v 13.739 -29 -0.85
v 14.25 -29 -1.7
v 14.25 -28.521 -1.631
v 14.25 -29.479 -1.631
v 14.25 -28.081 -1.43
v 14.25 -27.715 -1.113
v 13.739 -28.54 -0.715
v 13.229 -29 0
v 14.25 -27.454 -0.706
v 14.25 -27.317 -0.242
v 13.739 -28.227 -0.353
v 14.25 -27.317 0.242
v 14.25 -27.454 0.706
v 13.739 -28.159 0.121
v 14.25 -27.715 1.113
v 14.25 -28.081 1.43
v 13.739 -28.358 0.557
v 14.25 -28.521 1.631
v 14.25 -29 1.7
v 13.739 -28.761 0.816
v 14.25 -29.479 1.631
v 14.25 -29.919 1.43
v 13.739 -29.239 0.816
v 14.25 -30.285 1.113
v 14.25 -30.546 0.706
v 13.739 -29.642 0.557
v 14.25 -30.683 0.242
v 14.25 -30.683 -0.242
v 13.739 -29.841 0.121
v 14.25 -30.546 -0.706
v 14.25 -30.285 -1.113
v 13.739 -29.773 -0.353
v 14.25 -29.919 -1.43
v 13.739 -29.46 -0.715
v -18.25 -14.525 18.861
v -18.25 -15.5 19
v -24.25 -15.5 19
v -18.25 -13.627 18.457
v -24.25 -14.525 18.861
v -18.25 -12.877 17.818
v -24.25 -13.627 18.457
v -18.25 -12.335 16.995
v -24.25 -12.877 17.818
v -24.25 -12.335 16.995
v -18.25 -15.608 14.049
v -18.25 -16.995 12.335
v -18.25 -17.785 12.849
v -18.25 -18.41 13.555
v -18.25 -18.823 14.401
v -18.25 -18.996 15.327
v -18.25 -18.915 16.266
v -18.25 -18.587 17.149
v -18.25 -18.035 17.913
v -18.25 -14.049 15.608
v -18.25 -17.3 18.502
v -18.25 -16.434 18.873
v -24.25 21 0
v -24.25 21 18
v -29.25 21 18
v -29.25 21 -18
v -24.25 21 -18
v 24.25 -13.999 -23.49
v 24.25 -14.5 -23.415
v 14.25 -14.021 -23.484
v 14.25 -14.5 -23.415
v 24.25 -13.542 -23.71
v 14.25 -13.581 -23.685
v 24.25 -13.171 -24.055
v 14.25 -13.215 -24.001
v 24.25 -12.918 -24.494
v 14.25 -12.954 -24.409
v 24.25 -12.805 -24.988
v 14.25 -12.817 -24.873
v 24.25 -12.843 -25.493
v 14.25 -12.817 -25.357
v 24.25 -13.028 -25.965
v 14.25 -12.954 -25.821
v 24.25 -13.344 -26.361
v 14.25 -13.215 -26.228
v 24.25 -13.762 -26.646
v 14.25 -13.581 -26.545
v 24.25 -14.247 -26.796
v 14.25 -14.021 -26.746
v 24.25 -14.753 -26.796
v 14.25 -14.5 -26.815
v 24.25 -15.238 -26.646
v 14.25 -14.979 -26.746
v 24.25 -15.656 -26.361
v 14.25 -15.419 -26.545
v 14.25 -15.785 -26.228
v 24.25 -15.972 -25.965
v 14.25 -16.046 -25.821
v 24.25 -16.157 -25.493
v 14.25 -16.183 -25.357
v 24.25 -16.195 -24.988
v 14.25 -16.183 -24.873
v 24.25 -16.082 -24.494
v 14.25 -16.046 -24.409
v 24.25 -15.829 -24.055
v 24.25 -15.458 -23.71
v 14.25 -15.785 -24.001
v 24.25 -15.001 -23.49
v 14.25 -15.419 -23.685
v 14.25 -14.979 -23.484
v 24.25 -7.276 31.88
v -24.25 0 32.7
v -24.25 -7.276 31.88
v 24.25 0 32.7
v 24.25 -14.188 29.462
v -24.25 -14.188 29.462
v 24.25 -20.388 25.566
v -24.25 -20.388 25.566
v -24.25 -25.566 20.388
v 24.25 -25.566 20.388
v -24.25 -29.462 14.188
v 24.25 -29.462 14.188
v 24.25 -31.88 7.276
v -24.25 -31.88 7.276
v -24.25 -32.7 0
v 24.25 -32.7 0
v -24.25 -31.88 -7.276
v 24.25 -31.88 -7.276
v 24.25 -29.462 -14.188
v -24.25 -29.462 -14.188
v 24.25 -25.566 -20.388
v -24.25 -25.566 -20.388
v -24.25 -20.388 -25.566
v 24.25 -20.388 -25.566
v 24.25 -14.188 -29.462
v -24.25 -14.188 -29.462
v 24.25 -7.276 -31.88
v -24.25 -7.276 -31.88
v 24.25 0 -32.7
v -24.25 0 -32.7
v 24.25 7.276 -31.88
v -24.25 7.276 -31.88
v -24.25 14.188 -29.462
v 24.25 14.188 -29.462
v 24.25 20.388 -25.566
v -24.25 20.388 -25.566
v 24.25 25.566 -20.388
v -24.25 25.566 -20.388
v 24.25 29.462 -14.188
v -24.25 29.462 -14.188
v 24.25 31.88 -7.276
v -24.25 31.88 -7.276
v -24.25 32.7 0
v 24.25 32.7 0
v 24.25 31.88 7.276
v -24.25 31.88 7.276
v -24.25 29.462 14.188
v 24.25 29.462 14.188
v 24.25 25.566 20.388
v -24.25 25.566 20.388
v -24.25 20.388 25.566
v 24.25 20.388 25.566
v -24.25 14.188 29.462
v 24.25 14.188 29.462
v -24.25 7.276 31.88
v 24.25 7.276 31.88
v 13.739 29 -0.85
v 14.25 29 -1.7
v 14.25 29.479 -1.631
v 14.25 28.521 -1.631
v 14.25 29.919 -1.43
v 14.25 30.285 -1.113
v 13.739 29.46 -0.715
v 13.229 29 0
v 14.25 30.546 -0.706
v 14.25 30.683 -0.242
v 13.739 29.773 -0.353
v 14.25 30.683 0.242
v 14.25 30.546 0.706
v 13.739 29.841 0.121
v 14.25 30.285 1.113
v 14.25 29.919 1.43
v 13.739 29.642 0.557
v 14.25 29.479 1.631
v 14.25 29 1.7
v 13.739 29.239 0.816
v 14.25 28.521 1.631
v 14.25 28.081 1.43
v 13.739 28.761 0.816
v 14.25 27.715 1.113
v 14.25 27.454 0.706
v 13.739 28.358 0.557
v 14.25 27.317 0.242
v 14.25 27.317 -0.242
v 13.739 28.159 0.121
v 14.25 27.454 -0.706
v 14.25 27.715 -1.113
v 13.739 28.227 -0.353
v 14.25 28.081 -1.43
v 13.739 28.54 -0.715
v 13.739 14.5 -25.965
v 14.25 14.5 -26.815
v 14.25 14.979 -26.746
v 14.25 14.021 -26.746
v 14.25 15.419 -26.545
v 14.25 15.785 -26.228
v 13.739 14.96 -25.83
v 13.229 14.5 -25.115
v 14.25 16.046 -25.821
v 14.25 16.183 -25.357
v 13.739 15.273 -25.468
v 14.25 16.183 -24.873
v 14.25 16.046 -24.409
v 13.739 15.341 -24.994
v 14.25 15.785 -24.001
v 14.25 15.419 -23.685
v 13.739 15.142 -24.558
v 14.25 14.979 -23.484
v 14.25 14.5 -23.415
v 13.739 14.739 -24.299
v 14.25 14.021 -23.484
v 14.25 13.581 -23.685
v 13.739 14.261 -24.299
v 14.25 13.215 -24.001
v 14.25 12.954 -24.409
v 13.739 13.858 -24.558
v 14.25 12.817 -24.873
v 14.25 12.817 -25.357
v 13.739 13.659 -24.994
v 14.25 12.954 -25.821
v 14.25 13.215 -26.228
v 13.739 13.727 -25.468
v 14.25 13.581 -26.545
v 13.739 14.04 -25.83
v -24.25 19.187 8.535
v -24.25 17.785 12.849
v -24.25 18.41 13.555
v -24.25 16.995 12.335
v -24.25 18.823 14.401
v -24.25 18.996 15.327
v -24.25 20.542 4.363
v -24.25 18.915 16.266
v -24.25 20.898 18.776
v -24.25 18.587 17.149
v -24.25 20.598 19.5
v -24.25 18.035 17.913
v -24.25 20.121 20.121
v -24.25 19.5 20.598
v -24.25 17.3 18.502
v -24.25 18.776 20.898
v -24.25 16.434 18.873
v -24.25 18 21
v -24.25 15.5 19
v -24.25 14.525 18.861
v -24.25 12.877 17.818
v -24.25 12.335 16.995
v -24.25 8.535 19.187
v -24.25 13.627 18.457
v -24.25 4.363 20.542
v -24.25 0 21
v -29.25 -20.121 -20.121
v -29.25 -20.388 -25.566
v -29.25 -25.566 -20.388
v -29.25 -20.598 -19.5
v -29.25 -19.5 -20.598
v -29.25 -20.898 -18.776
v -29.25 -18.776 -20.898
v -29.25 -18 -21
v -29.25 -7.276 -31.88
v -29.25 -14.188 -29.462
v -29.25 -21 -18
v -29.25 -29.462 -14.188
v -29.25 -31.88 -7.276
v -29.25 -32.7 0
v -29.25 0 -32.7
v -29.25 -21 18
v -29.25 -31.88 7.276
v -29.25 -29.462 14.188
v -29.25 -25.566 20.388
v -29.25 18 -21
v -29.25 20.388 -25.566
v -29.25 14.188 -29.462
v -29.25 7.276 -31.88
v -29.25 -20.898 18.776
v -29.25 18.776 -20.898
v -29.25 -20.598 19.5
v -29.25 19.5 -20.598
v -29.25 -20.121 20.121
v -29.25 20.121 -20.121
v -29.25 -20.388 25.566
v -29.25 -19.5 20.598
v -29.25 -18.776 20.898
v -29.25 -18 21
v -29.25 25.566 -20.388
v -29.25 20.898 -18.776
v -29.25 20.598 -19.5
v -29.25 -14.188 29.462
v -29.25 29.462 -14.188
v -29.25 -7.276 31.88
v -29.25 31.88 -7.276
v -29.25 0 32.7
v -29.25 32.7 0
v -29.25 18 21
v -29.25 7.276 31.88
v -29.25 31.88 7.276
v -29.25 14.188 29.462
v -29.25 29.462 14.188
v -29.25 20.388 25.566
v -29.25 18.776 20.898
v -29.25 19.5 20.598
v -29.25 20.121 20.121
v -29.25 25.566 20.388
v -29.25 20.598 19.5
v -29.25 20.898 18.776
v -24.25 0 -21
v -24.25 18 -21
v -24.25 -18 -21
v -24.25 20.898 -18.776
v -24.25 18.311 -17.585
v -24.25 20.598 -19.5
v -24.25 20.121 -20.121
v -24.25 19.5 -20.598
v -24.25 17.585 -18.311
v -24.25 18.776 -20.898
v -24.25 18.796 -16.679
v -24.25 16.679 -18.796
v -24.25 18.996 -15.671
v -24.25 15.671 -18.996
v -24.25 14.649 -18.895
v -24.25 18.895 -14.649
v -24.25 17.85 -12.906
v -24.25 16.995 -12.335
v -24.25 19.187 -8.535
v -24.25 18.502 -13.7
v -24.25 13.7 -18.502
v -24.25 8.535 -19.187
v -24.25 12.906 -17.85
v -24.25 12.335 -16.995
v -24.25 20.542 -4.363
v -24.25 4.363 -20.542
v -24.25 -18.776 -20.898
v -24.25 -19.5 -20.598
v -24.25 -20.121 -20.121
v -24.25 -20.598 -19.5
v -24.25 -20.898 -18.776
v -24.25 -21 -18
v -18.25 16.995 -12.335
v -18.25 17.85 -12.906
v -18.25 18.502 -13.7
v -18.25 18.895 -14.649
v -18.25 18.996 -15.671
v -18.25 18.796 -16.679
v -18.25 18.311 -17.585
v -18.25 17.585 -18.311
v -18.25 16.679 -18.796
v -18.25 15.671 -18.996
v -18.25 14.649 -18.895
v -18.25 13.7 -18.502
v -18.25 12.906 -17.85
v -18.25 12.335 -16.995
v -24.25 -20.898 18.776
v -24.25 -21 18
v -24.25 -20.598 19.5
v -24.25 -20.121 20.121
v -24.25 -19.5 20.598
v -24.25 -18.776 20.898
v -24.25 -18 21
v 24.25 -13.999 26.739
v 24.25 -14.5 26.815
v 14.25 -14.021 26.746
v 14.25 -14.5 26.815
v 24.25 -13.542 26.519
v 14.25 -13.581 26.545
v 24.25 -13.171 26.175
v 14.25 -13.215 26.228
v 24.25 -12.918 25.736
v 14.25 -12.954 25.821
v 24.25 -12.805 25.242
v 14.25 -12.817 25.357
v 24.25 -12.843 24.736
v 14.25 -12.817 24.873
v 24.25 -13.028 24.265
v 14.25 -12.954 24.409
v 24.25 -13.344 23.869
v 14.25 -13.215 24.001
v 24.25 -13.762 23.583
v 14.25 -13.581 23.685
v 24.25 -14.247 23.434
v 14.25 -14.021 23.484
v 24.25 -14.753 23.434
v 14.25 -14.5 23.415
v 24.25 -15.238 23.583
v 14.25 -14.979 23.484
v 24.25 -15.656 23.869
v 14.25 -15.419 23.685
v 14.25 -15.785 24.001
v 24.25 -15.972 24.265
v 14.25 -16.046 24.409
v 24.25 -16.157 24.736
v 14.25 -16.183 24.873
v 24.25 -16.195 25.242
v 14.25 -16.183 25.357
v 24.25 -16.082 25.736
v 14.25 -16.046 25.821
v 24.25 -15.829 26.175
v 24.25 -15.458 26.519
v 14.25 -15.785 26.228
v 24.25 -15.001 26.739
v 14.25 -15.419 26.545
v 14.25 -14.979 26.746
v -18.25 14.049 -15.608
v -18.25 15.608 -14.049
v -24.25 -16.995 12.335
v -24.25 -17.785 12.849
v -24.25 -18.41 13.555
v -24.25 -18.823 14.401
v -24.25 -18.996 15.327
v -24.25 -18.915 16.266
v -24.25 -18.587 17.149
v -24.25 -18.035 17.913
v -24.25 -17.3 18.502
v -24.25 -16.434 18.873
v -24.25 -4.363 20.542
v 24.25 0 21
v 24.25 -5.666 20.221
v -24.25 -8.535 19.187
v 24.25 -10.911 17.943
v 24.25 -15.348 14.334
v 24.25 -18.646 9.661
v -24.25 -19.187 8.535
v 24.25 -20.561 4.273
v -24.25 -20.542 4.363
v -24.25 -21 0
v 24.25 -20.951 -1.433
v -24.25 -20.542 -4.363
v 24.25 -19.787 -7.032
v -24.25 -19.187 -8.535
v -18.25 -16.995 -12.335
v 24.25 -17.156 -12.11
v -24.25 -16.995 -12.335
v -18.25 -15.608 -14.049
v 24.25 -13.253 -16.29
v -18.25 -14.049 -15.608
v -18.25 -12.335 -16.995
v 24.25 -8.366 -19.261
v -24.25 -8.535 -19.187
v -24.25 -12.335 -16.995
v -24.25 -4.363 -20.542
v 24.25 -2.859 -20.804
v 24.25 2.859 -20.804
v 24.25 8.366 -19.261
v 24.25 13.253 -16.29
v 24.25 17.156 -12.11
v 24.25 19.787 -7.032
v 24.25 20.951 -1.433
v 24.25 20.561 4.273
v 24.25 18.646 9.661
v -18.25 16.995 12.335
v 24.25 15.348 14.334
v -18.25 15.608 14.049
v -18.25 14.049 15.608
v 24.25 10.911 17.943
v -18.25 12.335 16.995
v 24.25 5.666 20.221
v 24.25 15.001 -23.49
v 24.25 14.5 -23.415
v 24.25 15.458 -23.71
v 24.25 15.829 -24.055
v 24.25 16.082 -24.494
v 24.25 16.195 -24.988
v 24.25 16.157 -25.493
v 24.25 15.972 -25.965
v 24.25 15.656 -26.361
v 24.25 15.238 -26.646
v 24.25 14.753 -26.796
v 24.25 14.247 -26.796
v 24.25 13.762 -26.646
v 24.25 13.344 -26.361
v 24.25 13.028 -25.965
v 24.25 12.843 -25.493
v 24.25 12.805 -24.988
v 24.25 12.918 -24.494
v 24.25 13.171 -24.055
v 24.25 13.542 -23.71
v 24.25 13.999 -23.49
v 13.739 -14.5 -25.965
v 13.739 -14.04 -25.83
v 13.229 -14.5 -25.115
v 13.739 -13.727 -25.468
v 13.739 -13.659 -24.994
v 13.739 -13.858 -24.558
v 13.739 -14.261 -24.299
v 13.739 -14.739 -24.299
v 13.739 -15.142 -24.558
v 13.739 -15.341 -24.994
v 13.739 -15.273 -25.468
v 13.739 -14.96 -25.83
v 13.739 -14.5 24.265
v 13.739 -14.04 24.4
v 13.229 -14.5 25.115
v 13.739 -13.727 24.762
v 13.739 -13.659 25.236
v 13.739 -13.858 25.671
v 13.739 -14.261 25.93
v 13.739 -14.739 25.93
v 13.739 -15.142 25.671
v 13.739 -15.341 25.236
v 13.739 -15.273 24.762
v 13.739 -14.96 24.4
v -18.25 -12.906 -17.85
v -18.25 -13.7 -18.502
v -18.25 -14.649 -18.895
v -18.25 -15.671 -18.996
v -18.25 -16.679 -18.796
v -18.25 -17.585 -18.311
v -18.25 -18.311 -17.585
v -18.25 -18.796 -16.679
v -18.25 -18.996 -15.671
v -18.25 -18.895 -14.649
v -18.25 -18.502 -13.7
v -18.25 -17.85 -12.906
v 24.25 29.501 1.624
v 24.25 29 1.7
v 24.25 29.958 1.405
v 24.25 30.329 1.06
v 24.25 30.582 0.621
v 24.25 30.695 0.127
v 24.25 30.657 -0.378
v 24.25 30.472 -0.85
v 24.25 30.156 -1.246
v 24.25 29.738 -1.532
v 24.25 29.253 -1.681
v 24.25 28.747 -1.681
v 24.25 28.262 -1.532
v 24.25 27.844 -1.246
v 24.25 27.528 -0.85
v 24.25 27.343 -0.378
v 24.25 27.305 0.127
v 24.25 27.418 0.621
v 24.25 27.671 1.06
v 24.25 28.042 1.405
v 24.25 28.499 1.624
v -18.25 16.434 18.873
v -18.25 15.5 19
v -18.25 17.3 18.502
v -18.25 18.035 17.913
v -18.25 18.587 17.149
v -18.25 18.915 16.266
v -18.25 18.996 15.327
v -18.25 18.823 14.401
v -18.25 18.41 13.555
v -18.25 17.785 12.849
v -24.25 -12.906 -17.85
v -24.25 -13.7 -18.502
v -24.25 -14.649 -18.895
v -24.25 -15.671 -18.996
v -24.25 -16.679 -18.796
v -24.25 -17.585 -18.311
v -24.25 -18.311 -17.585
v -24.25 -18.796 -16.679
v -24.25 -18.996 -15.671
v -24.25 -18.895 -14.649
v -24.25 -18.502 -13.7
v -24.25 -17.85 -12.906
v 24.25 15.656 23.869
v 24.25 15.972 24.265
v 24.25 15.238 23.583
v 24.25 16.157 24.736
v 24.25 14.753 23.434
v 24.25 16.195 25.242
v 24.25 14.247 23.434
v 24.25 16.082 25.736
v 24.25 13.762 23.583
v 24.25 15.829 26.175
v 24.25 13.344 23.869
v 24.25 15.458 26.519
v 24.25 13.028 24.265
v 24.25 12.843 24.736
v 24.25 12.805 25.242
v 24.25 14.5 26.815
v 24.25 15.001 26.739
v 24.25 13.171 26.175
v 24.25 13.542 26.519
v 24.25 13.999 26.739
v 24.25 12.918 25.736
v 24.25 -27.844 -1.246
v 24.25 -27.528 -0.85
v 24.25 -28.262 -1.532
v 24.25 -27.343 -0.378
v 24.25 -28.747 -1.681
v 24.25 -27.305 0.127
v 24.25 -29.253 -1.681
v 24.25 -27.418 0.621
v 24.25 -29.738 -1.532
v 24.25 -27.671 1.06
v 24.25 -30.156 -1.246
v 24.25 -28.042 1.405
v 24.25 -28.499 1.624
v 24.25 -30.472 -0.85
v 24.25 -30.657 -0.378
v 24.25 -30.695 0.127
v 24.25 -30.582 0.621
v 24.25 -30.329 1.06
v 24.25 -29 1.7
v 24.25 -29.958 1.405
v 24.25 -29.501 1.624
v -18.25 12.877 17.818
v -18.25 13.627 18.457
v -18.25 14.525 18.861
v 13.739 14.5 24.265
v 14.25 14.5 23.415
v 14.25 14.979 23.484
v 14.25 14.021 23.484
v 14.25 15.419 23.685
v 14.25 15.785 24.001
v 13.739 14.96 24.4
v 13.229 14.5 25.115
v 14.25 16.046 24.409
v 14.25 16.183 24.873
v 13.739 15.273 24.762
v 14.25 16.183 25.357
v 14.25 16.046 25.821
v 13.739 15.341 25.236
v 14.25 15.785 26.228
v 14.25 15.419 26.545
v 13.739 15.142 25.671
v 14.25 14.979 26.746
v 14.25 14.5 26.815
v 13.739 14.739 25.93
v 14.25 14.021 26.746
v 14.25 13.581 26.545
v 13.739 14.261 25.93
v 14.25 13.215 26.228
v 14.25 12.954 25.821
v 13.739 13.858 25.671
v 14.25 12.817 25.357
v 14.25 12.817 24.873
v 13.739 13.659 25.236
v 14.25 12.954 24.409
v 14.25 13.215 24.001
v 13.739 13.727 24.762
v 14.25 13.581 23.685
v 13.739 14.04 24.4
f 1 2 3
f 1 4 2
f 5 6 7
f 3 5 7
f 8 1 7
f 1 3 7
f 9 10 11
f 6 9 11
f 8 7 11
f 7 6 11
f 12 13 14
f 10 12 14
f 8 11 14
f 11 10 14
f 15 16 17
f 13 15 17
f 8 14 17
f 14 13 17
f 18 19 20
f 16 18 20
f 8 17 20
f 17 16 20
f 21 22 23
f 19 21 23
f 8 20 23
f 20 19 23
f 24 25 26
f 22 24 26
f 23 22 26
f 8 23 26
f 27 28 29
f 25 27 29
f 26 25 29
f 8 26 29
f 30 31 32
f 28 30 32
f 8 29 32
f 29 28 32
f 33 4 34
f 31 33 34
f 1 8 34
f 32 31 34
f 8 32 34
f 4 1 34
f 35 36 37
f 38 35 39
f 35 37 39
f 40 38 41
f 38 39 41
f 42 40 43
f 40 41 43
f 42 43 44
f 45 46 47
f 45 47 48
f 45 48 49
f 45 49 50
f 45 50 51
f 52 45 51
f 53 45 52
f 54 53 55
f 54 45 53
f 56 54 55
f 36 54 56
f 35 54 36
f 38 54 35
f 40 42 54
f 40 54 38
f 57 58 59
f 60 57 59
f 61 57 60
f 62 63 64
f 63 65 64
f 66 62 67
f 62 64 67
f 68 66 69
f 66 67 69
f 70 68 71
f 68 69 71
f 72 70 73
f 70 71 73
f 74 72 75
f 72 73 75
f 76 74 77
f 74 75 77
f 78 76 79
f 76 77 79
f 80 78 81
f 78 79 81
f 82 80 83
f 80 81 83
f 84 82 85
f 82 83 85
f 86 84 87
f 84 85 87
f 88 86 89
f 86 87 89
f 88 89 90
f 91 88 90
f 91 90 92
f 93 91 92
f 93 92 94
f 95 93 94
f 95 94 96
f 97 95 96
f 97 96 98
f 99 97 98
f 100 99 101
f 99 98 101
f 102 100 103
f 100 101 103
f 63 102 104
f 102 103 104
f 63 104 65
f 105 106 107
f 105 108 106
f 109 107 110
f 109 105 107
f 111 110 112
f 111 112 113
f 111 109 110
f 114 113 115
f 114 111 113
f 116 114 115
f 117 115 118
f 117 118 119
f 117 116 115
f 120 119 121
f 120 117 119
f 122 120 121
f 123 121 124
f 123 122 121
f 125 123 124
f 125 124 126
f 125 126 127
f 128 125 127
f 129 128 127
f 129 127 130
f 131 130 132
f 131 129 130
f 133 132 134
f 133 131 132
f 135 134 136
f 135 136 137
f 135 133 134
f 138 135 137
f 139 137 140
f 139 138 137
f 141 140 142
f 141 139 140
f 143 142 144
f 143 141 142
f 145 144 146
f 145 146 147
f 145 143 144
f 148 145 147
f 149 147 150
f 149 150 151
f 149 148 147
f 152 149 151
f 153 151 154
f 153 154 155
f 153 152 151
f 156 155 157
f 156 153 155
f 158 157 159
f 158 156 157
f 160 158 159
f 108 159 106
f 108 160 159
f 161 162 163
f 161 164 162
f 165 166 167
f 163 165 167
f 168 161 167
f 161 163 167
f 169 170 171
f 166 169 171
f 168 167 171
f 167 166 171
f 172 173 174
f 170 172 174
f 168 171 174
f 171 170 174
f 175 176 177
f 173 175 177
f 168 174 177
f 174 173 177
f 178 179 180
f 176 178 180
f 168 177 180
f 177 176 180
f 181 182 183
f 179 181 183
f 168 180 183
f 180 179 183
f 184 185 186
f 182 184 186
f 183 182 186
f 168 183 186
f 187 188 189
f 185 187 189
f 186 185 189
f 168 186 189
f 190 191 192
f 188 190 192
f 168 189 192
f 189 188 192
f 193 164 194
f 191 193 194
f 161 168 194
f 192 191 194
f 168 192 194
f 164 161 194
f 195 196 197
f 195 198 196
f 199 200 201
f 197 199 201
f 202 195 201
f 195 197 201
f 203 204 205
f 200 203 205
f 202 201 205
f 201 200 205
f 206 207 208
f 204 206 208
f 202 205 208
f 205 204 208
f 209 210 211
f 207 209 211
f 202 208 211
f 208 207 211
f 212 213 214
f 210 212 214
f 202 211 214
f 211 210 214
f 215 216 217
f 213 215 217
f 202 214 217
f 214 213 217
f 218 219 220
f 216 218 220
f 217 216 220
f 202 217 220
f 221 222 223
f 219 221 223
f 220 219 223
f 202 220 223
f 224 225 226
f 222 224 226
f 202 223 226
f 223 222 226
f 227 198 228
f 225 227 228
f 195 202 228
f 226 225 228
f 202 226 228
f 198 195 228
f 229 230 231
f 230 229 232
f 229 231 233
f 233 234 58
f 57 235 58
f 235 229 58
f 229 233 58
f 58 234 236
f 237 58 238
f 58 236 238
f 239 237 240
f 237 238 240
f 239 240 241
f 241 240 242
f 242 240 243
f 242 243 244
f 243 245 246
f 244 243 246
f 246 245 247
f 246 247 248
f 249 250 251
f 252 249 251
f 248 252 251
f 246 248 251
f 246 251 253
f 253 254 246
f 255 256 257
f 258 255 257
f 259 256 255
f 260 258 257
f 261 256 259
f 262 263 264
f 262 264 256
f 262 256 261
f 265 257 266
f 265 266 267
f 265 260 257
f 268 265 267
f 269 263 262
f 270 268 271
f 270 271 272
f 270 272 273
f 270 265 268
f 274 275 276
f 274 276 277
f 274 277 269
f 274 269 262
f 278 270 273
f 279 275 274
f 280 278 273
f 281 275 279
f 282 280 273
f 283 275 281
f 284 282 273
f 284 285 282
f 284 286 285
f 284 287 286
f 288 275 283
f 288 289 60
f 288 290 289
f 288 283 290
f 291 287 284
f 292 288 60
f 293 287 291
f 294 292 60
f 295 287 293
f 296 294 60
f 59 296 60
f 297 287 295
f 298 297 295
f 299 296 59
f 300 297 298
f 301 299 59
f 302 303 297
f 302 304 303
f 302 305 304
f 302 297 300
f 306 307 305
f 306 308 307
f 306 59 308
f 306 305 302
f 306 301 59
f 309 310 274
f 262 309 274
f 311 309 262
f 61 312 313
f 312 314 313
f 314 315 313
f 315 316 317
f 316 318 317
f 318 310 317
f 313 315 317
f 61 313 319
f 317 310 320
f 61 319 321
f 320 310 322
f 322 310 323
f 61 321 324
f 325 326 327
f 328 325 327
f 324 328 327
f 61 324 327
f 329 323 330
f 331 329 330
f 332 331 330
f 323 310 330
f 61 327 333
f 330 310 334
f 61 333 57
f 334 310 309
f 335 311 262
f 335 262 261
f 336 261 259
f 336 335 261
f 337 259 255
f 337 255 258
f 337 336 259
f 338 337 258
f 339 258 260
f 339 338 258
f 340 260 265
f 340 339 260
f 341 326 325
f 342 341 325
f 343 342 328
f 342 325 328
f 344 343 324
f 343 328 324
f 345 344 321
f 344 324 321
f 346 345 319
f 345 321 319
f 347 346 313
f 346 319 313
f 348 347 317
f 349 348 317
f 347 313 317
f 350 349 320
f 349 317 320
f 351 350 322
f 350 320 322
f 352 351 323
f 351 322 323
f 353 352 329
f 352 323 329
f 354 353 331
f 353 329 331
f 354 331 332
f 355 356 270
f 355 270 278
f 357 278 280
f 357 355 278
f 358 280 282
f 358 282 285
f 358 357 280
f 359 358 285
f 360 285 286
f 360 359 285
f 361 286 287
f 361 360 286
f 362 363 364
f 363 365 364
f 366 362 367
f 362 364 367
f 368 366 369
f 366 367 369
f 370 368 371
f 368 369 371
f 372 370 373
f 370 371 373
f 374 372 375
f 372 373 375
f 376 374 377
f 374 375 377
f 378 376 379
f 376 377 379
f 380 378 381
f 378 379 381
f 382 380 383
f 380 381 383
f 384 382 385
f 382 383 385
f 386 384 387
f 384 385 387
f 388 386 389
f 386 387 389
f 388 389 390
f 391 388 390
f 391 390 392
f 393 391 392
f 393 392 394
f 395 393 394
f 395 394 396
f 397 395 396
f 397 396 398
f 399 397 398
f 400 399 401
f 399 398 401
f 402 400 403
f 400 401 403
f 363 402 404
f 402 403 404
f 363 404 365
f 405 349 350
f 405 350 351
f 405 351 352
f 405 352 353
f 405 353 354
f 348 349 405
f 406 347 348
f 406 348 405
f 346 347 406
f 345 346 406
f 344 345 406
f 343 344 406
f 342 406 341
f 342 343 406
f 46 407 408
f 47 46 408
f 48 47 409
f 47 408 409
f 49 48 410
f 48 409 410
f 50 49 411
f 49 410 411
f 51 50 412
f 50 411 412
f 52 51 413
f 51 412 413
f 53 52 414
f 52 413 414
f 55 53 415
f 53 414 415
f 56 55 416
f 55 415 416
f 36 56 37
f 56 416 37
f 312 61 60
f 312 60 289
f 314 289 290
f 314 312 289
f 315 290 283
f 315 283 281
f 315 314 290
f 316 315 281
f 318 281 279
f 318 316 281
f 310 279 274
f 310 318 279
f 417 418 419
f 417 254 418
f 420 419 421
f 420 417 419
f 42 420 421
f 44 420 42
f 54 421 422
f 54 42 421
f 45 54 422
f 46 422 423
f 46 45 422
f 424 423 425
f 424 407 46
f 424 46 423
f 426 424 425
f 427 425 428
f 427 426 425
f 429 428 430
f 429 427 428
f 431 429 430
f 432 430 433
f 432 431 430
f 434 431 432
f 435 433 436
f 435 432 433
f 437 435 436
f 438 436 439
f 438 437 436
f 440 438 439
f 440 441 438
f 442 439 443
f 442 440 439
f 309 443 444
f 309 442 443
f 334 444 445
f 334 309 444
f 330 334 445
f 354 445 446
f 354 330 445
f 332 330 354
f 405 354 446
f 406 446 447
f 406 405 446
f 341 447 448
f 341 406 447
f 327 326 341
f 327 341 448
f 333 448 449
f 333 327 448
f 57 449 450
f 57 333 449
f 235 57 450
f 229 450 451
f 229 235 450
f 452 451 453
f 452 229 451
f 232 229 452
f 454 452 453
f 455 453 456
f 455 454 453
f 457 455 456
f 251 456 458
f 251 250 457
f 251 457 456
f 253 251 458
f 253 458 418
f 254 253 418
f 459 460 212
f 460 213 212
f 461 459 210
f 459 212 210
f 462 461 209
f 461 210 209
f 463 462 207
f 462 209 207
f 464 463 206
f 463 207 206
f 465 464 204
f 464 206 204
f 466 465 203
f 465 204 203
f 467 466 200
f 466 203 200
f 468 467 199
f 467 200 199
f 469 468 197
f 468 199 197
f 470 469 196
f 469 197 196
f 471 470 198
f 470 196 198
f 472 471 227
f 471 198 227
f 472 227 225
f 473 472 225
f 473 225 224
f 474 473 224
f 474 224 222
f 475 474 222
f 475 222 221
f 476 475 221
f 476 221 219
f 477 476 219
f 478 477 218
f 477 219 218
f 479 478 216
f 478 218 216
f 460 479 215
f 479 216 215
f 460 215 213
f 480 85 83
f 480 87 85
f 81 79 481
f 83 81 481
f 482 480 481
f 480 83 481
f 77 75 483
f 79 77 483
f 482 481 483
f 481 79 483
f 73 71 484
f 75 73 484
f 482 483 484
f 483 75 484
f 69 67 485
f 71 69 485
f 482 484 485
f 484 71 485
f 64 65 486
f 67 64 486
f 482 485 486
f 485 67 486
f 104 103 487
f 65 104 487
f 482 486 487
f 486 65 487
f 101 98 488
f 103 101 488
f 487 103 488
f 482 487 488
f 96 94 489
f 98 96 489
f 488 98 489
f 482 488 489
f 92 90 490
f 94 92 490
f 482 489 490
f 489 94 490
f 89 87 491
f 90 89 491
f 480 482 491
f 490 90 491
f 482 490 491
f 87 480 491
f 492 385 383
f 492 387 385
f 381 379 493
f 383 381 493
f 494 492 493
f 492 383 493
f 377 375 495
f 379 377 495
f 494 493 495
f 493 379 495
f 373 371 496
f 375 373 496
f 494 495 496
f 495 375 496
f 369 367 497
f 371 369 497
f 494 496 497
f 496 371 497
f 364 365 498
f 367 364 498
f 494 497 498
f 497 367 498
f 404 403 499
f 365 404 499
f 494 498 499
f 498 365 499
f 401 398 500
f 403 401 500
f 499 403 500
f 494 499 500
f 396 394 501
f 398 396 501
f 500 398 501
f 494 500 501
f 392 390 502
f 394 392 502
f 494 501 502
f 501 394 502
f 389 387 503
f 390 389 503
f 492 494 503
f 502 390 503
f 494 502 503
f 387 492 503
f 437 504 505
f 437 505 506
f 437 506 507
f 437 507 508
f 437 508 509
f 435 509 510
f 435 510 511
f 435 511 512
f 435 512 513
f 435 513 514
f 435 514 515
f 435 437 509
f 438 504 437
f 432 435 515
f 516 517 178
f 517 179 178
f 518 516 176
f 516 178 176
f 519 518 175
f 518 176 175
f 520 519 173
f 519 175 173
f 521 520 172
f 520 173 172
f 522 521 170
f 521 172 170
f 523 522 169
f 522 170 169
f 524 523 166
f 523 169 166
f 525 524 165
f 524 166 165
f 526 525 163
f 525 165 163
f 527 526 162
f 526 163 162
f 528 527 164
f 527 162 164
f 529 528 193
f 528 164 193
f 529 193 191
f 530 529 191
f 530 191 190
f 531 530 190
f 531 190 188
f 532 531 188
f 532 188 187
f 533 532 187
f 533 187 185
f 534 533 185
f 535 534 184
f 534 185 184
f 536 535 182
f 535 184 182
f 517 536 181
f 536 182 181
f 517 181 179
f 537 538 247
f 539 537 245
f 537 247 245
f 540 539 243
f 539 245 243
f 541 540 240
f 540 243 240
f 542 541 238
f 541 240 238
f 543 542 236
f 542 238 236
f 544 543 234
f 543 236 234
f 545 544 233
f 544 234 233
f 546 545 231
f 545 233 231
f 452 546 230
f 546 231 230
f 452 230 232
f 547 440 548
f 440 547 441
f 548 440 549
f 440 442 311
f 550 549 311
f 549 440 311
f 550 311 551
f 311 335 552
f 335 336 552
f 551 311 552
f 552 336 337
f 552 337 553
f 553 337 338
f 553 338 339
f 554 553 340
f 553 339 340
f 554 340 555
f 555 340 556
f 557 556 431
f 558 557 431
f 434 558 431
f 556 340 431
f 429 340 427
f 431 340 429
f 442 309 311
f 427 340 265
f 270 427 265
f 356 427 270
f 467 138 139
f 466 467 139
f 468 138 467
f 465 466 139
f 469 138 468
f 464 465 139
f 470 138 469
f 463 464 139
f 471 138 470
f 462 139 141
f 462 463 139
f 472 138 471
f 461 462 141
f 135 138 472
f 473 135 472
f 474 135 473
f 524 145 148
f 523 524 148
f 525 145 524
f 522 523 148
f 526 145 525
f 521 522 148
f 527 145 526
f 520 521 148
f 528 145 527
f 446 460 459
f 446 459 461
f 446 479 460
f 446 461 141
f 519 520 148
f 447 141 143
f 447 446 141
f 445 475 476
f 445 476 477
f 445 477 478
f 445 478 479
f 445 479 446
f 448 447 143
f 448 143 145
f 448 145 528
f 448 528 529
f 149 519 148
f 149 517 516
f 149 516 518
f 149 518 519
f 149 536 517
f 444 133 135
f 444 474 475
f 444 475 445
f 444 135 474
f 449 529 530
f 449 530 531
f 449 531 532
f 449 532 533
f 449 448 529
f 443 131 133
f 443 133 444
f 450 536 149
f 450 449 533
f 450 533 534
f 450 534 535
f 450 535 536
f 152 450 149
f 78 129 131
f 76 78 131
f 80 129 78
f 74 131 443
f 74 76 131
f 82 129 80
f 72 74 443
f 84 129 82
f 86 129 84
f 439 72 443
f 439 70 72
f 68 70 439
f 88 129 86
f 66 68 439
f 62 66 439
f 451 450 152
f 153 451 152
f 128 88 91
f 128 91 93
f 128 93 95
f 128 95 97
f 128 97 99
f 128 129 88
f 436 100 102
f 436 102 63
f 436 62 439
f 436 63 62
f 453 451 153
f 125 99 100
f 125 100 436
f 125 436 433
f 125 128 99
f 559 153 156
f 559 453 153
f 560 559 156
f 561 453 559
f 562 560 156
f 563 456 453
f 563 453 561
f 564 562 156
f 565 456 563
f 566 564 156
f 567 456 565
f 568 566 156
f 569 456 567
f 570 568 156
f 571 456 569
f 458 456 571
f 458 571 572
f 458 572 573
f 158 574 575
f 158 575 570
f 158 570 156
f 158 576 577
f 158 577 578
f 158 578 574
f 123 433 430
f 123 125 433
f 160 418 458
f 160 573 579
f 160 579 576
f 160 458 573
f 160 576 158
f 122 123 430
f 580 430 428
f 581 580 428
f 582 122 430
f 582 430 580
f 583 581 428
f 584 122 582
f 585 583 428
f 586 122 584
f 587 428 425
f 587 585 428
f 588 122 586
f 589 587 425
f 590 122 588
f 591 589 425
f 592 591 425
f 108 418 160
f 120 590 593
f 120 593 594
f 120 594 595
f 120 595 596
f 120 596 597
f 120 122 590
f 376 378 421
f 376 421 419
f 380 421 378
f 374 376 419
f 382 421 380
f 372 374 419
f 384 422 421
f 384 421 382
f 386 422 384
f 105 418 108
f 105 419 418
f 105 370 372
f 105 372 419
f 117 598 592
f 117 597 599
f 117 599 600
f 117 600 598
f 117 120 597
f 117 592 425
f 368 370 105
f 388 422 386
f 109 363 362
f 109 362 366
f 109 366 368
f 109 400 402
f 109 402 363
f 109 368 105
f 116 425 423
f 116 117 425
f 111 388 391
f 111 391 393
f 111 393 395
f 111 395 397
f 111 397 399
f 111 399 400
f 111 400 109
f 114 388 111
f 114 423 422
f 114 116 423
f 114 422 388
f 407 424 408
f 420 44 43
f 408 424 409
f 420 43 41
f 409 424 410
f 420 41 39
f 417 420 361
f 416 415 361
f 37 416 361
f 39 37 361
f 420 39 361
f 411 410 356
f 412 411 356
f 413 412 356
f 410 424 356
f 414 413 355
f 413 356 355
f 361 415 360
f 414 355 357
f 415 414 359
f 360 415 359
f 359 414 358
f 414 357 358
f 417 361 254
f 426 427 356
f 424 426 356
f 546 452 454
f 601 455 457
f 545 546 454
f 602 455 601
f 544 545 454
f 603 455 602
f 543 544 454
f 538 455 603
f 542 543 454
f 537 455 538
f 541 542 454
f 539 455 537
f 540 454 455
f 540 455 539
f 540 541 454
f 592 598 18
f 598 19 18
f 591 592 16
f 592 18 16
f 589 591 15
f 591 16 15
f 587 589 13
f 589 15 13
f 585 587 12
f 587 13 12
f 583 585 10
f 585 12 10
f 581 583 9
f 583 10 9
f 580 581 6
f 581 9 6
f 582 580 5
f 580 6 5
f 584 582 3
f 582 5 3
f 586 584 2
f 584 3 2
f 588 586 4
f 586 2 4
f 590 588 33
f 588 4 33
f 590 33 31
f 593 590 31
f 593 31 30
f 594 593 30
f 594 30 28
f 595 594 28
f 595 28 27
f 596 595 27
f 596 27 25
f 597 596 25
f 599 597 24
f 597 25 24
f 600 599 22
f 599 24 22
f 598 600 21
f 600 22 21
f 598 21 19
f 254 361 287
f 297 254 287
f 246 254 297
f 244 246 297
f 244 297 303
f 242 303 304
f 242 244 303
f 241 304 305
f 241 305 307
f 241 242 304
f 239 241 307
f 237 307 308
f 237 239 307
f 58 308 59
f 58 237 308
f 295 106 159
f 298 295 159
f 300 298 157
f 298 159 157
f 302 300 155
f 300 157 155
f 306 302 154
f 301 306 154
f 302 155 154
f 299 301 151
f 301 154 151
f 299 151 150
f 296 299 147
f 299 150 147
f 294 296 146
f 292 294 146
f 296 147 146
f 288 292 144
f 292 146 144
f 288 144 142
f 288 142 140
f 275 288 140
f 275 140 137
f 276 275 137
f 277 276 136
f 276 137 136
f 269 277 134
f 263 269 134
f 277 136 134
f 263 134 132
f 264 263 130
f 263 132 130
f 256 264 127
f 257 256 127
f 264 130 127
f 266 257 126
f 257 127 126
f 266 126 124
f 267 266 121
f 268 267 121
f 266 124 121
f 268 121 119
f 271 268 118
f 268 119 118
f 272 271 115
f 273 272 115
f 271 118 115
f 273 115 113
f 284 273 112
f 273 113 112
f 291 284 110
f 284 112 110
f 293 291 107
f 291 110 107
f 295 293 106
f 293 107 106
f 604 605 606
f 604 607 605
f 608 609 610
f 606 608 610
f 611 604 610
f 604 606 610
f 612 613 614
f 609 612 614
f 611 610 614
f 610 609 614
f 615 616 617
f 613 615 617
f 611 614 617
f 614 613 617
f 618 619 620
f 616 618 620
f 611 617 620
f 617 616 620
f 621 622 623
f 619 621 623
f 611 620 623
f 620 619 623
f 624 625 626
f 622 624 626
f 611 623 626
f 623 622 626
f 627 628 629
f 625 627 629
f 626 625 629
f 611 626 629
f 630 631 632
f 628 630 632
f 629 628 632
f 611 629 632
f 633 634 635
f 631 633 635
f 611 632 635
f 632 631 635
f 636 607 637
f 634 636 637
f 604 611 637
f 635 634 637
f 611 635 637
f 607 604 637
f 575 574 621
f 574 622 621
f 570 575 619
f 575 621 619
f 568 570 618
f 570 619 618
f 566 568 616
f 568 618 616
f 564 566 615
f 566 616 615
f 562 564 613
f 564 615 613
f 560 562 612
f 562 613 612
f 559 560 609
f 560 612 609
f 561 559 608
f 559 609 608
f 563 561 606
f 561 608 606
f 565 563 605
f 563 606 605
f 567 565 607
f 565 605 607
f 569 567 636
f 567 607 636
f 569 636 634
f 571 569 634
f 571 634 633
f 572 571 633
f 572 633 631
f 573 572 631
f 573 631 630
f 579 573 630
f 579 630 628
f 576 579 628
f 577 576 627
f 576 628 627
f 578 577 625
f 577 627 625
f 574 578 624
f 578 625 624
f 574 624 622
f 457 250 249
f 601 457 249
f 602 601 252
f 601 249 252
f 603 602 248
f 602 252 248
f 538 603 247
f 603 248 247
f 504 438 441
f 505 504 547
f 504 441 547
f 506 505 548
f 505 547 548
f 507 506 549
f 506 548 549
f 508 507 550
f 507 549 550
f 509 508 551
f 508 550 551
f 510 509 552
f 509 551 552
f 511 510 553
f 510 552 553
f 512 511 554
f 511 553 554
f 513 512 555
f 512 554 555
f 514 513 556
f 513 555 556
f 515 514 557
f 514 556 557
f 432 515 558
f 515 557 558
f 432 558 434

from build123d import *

# Parameters (mm, degrees)
CROQUIS1_R                       = 32.7
CROQUIS1_R_2                     = 21
SALIENTE_EXTRUIR1_DEPTH          = 24.25
CROQUIS3_R                       = 32.7
SALIENTE_EXTRUIR3_DEPTH          = 5
CROQUIS4_R                       = 3.5
CORTAR_EXTRUIR1_DEPTH            = 6
TALADRO_DE_MARGEN_PARA_M31_D     = 3.4
TALADRO_DE_MARGEN_PARA_M31_DEPTH = 10
TALADRO_DE_MARGEN_PARA_M31_TIP   = 1.021463052


with BuildPart() as part:
    # Croquis1 → Saliente-Extruir1 (new, symmetric)
    with BuildSketch(Plane(origin=(0, 0, 0), x_dir=(0, 0, -1), z_dir=(1, 0, 0))):
        with Locations(Location((0, 0, 0), (0, 0, 180))):
            Circle(CROQUIS1_R)
        with Locations(Location((0, 0, 0), (0, 0, 180))):
            Circle(CROQUIS1_R_2, mode=Mode.SUBTRACT)
    extrude(amount=SALIENTE_EXTRUIR1_DEPTH, both=True)

    # Croquis3 → Saliente-Extruir3 (add)
    with BuildSketch(Plane.ZY.offset(24.25)):
        Circle(CROQUIS3_R)
        with BuildLine():
            Line((-18, -21), (18, -21))
            ThreePointArc((18, -21), (20.121320344, -20.121320344), (21, -18))
            Line((21, -18), (21, 18))
            ThreePointArc((21, 18), (20.121320344, 20.121320344), (18, 21))
            Line((18, 21), (-18, 21))
            ThreePointArc((-18, 21), (-20.121320344, 20.121320344), (-21, 18))
            Line((-21, 18), (-21, -18))
            ThreePointArc((-21, -18), (-20.121320344, -20.121320344), (-18, -21))
        make_face(mode=Mode.SUBTRACT)
    extrude(amount=SALIENTE_EXTRUIR3_DEPTH)

    # Croquis4 → Cortar-Extruir1 (cut)
    with BuildSketch(Plane.ZY.offset(24.25)):
        with Locations((15.5, 15.5)):
            Circle(CROQUIS4_R)
        with Locations((-15.5, 15.5)):
            Circle(CROQUIS4_R)
        with Locations((-15.5, -15.5)):
            Circle(CROQUIS4_R)
        with Locations((15.5, -15.5)):
            Circle(CROQUIS4_R)
    extrude(amount=-CORTAR_EXTRUIR1_DEPTH, mode=Mode.SUBTRACT)

    # Taladro de margen para M31
    with Locations(Plane(origin=(24.25, 0, 0), x_dir=(0, 0, -1), z_dir=(1, 0, 0))):
        with Locations((0, 29), (25.11473671, 14.5), (25.11473671, -14.5), (0, -29), (-25.11473671, -14.5), (-25.11473671, 14.5)):
            Hole(TALADRO_DE_MARGEN_PARA_M31_D / 2, depth=TALADRO_DE_MARGEN_PARA_M31_DEPTH)
            with Locations((0, 0, -(TALADRO_DE_MARGEN_PARA_M31_DEPTH + TALADRO_DE_MARGEN_PARA_M31_TIP / 2))):  # 118° drill point
                Cone(0, TALADRO_DE_MARGEN_PARA_M31_D / 2, TALADRO_DE_MARGEN_PARA_M31_TIP, mode=Mode.SUBTRACT)


solid = part.part
